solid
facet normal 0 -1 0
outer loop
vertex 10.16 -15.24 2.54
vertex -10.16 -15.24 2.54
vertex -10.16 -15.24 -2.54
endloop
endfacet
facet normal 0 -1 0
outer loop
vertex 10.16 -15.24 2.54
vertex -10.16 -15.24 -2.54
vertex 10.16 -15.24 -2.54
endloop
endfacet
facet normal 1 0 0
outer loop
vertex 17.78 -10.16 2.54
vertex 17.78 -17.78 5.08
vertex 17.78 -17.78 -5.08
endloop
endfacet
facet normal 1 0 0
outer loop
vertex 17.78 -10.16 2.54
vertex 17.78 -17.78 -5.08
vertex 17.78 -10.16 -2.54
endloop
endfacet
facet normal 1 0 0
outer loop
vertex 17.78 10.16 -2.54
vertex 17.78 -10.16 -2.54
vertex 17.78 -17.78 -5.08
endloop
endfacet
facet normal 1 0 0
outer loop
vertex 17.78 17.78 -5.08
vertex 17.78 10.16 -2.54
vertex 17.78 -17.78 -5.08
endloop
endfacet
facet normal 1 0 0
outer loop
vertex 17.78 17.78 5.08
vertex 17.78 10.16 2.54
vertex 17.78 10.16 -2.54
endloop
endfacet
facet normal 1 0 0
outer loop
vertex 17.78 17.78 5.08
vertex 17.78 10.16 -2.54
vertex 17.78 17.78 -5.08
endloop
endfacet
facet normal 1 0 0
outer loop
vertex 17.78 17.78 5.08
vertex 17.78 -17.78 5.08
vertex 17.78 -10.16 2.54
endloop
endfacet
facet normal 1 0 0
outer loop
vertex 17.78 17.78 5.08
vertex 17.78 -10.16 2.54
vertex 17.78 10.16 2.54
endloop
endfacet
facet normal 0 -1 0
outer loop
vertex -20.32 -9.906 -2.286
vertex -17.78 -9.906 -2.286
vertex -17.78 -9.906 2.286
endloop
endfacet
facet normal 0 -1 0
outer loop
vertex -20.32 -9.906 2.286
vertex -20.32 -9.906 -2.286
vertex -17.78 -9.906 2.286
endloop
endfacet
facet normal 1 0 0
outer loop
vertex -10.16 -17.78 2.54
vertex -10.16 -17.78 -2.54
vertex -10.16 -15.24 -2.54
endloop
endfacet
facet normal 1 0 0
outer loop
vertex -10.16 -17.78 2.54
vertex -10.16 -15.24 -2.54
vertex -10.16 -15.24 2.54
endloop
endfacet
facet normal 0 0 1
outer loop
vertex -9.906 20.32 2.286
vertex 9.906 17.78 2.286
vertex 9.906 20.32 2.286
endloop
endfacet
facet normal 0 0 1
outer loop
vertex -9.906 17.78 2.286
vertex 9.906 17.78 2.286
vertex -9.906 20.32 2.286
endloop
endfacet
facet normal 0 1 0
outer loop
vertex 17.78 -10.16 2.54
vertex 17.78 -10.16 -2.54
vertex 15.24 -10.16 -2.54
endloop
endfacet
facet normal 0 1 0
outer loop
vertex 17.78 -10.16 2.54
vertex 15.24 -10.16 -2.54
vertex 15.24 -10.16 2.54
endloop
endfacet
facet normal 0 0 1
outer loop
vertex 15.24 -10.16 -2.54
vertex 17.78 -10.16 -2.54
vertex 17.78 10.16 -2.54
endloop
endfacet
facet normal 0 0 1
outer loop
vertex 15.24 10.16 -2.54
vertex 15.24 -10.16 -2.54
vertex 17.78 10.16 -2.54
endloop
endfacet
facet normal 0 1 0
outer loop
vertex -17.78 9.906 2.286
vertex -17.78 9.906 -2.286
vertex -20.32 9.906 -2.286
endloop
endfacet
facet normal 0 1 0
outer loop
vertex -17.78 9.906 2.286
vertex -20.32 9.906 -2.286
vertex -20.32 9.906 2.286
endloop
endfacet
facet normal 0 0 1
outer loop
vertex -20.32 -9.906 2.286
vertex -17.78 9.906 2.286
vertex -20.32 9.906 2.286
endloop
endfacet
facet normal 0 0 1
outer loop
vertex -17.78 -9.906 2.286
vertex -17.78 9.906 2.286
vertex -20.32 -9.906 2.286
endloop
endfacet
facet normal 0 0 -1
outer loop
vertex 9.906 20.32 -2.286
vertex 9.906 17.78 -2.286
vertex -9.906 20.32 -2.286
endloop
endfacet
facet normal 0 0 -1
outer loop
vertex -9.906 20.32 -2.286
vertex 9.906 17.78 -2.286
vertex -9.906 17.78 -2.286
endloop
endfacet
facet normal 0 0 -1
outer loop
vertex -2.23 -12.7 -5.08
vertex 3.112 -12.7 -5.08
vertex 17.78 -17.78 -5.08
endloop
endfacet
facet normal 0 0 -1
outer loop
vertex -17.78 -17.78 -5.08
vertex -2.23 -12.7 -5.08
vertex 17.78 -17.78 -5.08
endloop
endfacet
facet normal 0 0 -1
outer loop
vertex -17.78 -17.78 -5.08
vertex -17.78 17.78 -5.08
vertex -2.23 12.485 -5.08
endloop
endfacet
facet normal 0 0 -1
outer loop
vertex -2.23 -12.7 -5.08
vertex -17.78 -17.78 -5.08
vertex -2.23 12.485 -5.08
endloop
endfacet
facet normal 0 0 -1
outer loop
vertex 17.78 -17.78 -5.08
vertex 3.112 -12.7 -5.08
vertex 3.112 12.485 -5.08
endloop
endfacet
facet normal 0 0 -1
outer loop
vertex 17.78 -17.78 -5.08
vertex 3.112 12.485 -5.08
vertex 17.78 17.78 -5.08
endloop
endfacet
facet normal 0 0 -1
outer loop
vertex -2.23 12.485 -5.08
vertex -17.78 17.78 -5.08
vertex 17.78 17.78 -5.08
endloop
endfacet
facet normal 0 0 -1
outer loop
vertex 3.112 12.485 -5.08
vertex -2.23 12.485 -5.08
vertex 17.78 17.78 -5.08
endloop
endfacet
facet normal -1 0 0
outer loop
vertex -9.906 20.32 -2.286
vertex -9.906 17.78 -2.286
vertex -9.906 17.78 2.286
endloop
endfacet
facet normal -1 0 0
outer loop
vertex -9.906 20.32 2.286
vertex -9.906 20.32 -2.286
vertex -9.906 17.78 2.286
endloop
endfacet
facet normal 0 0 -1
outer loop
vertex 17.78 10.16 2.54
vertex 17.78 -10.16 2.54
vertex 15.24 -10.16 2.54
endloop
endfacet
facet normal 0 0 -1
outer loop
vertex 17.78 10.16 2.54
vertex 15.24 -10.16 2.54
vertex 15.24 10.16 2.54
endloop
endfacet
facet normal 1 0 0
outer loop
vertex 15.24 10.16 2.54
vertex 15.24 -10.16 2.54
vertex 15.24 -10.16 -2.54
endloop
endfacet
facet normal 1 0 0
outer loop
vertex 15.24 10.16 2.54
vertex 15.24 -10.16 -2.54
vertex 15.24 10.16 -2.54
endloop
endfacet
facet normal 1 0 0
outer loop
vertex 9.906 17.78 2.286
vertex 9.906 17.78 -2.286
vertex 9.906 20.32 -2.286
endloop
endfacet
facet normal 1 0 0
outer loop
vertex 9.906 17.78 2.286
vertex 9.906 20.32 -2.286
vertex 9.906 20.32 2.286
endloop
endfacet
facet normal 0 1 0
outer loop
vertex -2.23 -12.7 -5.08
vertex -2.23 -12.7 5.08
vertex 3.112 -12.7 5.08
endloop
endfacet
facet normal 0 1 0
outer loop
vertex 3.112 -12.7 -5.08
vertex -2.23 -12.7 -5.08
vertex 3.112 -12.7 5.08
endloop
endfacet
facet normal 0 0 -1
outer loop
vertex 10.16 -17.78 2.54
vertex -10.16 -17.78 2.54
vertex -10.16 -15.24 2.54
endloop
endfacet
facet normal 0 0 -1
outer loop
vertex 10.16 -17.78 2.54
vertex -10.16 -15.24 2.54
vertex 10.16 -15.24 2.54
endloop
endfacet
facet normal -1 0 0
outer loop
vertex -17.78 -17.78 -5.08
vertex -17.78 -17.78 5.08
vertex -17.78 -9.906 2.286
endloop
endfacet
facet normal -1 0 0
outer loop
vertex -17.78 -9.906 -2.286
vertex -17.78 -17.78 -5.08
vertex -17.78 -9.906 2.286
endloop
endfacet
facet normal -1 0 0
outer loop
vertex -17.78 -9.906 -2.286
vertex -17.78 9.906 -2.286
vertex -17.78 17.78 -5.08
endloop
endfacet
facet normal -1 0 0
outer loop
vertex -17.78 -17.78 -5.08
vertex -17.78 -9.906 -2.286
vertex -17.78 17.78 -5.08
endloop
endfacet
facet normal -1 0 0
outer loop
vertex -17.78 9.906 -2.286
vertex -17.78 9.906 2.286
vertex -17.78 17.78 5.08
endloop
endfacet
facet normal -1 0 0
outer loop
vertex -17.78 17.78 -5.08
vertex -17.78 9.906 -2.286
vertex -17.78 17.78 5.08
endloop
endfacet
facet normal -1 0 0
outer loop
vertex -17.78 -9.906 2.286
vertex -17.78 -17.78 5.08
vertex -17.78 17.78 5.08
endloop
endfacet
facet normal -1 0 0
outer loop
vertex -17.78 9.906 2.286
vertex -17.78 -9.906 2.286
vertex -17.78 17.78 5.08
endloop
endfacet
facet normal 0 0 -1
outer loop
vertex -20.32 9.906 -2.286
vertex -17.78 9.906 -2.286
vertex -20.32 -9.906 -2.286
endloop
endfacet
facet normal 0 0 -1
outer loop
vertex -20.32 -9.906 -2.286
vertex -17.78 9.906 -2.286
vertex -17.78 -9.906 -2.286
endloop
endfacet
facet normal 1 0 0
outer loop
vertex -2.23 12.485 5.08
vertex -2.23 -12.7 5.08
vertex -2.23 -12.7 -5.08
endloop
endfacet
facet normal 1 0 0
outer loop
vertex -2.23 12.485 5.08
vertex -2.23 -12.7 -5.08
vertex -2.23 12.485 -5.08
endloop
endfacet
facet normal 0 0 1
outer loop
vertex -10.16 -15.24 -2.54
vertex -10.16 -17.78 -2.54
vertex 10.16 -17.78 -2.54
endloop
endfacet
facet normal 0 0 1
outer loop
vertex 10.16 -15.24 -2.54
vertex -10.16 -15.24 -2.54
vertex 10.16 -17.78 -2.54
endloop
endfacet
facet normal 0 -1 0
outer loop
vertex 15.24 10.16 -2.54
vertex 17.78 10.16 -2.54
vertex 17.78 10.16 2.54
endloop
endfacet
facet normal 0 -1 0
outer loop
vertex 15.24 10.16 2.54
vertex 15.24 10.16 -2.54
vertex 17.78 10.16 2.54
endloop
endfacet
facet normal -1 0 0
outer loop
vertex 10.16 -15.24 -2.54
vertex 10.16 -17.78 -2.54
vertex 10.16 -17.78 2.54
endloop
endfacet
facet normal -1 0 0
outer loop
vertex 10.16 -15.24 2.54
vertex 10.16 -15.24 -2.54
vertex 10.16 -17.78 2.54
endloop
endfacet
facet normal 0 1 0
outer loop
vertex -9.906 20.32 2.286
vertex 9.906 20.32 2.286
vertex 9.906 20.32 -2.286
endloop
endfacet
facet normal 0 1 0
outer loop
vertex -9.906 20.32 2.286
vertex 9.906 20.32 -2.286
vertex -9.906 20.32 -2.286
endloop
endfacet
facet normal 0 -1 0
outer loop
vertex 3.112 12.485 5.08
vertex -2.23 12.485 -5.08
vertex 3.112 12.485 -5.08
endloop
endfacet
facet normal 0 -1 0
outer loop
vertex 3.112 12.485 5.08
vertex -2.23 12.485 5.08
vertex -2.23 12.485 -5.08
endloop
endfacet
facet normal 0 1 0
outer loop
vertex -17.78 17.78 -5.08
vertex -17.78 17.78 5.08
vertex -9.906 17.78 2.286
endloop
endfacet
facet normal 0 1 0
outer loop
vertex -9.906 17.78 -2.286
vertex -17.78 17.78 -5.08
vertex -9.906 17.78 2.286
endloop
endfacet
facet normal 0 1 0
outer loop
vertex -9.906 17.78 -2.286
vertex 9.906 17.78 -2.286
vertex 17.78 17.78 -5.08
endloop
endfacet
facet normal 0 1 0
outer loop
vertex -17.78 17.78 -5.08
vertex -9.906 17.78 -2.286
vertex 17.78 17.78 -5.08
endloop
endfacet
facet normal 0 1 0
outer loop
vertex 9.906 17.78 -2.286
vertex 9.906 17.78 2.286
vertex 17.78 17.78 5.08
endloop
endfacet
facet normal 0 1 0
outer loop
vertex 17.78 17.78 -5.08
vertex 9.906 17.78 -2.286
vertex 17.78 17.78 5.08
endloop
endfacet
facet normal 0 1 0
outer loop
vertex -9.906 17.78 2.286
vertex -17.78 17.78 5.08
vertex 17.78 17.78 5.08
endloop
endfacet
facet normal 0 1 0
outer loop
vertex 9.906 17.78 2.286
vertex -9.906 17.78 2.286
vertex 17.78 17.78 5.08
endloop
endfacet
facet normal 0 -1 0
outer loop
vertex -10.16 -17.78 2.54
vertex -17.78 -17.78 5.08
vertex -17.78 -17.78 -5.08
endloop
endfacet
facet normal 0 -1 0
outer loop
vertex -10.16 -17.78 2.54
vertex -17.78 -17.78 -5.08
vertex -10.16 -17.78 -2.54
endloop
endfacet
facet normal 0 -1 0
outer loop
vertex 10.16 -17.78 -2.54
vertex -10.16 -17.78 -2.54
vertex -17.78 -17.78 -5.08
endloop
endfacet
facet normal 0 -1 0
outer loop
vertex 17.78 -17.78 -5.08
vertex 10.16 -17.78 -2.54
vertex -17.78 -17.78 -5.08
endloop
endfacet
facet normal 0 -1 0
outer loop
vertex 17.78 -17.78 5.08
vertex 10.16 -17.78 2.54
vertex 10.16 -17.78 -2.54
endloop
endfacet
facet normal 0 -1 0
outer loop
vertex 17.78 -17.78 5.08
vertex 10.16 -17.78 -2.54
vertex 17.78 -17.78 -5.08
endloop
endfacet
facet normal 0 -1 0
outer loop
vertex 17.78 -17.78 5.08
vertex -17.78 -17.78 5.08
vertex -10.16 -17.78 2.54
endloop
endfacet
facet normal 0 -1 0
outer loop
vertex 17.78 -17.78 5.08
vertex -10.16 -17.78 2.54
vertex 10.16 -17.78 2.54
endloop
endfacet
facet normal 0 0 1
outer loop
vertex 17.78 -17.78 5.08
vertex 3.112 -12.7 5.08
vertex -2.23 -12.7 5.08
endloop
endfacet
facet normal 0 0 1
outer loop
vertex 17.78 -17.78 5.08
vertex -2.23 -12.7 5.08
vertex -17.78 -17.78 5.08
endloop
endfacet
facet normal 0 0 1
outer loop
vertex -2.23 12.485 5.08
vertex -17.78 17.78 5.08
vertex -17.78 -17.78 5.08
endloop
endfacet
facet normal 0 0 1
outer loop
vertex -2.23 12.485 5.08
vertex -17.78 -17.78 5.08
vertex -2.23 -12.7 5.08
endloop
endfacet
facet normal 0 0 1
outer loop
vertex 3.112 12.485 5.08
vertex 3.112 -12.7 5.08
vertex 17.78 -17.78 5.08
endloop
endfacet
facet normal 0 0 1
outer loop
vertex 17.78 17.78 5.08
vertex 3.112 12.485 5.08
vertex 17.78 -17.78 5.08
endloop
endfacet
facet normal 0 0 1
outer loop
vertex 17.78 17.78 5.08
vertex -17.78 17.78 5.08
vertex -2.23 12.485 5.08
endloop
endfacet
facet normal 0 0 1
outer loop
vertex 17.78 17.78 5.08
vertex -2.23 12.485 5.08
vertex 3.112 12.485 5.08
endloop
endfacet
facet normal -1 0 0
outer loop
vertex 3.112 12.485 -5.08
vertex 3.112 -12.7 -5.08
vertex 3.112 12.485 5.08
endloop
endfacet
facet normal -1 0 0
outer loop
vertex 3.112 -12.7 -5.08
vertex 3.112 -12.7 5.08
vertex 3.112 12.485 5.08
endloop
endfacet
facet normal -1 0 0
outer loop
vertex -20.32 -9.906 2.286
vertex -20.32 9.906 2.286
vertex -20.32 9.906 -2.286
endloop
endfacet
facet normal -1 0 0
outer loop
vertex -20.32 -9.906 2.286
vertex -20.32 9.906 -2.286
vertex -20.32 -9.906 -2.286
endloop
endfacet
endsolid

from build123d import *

# Parameters (mm, degrees)
F0_W     = 35.56
F0_H     = 35.56
F0_W_2   = 5.3412760417
F0_H_2   = 25.1850260417
F1_DEPTH = 5.08
F2_W     = 19.812
F2_H     = 4.572
F3_DEPTH = 2.54
F4_W     = 19.812
F4_H     = 4.572
F5_DEPTH = 2.54
F6_W     = 20.32
F6_H     = 5.08
F7_DEPTH = 2.54
F8_W     = 20.32
F8_H     = 5.08
F9_DEPTH = 2.54


with BuildPart() as f1:
    # F0 (on Top) → F1 (new body, symmetric)
    with BuildSketch(Plane.XY):
        Rectangle(F0_W, F0_H)
        with Locations((0.4409722222, -0.1074869792)):
            Rectangle(F0_W_2, F0_H_2, mode=Mode.SUBTRACT)
    extrude(amount=F1_DEPTH, both=True)

    # F2 (on face) → F3 (join)
    with BuildSketch(Plane(origin=(0, 17.78, 0), x_dir=(-1, 0, 0), z_dir=(0, 1, 0))):
        Rectangle(F2_W, F2_H)
    extrude(amount=F3_DEPTH)

    # F4 (on face) → F5 (join)
    with BuildSketch(Plane(origin=(-17.78, 0, 0), x_dir=(0, -1, 0), z_dir=(-1, 0, 0))):
        Rectangle(F4_W, F4_H)
    extrude(amount=F5_DEPTH)

    # F6 (on face) → F7 (cut)
    with BuildSketch(Plane.XZ.offset(17.78)):
        Rectangle(F6_W, F6_H)
    extrude(amount=-F7_DEPTH, mode=Mode.SUBTRACT)

    # F8 (on face) → F9 (cut)
    with BuildSketch(Plane.YZ.offset(17.78)):
        Rectangle(F8_W, F8_H)
    extrude(amount=-F9_DEPTH, mode=Mode.SUBTRACT)


solid = f1.part
